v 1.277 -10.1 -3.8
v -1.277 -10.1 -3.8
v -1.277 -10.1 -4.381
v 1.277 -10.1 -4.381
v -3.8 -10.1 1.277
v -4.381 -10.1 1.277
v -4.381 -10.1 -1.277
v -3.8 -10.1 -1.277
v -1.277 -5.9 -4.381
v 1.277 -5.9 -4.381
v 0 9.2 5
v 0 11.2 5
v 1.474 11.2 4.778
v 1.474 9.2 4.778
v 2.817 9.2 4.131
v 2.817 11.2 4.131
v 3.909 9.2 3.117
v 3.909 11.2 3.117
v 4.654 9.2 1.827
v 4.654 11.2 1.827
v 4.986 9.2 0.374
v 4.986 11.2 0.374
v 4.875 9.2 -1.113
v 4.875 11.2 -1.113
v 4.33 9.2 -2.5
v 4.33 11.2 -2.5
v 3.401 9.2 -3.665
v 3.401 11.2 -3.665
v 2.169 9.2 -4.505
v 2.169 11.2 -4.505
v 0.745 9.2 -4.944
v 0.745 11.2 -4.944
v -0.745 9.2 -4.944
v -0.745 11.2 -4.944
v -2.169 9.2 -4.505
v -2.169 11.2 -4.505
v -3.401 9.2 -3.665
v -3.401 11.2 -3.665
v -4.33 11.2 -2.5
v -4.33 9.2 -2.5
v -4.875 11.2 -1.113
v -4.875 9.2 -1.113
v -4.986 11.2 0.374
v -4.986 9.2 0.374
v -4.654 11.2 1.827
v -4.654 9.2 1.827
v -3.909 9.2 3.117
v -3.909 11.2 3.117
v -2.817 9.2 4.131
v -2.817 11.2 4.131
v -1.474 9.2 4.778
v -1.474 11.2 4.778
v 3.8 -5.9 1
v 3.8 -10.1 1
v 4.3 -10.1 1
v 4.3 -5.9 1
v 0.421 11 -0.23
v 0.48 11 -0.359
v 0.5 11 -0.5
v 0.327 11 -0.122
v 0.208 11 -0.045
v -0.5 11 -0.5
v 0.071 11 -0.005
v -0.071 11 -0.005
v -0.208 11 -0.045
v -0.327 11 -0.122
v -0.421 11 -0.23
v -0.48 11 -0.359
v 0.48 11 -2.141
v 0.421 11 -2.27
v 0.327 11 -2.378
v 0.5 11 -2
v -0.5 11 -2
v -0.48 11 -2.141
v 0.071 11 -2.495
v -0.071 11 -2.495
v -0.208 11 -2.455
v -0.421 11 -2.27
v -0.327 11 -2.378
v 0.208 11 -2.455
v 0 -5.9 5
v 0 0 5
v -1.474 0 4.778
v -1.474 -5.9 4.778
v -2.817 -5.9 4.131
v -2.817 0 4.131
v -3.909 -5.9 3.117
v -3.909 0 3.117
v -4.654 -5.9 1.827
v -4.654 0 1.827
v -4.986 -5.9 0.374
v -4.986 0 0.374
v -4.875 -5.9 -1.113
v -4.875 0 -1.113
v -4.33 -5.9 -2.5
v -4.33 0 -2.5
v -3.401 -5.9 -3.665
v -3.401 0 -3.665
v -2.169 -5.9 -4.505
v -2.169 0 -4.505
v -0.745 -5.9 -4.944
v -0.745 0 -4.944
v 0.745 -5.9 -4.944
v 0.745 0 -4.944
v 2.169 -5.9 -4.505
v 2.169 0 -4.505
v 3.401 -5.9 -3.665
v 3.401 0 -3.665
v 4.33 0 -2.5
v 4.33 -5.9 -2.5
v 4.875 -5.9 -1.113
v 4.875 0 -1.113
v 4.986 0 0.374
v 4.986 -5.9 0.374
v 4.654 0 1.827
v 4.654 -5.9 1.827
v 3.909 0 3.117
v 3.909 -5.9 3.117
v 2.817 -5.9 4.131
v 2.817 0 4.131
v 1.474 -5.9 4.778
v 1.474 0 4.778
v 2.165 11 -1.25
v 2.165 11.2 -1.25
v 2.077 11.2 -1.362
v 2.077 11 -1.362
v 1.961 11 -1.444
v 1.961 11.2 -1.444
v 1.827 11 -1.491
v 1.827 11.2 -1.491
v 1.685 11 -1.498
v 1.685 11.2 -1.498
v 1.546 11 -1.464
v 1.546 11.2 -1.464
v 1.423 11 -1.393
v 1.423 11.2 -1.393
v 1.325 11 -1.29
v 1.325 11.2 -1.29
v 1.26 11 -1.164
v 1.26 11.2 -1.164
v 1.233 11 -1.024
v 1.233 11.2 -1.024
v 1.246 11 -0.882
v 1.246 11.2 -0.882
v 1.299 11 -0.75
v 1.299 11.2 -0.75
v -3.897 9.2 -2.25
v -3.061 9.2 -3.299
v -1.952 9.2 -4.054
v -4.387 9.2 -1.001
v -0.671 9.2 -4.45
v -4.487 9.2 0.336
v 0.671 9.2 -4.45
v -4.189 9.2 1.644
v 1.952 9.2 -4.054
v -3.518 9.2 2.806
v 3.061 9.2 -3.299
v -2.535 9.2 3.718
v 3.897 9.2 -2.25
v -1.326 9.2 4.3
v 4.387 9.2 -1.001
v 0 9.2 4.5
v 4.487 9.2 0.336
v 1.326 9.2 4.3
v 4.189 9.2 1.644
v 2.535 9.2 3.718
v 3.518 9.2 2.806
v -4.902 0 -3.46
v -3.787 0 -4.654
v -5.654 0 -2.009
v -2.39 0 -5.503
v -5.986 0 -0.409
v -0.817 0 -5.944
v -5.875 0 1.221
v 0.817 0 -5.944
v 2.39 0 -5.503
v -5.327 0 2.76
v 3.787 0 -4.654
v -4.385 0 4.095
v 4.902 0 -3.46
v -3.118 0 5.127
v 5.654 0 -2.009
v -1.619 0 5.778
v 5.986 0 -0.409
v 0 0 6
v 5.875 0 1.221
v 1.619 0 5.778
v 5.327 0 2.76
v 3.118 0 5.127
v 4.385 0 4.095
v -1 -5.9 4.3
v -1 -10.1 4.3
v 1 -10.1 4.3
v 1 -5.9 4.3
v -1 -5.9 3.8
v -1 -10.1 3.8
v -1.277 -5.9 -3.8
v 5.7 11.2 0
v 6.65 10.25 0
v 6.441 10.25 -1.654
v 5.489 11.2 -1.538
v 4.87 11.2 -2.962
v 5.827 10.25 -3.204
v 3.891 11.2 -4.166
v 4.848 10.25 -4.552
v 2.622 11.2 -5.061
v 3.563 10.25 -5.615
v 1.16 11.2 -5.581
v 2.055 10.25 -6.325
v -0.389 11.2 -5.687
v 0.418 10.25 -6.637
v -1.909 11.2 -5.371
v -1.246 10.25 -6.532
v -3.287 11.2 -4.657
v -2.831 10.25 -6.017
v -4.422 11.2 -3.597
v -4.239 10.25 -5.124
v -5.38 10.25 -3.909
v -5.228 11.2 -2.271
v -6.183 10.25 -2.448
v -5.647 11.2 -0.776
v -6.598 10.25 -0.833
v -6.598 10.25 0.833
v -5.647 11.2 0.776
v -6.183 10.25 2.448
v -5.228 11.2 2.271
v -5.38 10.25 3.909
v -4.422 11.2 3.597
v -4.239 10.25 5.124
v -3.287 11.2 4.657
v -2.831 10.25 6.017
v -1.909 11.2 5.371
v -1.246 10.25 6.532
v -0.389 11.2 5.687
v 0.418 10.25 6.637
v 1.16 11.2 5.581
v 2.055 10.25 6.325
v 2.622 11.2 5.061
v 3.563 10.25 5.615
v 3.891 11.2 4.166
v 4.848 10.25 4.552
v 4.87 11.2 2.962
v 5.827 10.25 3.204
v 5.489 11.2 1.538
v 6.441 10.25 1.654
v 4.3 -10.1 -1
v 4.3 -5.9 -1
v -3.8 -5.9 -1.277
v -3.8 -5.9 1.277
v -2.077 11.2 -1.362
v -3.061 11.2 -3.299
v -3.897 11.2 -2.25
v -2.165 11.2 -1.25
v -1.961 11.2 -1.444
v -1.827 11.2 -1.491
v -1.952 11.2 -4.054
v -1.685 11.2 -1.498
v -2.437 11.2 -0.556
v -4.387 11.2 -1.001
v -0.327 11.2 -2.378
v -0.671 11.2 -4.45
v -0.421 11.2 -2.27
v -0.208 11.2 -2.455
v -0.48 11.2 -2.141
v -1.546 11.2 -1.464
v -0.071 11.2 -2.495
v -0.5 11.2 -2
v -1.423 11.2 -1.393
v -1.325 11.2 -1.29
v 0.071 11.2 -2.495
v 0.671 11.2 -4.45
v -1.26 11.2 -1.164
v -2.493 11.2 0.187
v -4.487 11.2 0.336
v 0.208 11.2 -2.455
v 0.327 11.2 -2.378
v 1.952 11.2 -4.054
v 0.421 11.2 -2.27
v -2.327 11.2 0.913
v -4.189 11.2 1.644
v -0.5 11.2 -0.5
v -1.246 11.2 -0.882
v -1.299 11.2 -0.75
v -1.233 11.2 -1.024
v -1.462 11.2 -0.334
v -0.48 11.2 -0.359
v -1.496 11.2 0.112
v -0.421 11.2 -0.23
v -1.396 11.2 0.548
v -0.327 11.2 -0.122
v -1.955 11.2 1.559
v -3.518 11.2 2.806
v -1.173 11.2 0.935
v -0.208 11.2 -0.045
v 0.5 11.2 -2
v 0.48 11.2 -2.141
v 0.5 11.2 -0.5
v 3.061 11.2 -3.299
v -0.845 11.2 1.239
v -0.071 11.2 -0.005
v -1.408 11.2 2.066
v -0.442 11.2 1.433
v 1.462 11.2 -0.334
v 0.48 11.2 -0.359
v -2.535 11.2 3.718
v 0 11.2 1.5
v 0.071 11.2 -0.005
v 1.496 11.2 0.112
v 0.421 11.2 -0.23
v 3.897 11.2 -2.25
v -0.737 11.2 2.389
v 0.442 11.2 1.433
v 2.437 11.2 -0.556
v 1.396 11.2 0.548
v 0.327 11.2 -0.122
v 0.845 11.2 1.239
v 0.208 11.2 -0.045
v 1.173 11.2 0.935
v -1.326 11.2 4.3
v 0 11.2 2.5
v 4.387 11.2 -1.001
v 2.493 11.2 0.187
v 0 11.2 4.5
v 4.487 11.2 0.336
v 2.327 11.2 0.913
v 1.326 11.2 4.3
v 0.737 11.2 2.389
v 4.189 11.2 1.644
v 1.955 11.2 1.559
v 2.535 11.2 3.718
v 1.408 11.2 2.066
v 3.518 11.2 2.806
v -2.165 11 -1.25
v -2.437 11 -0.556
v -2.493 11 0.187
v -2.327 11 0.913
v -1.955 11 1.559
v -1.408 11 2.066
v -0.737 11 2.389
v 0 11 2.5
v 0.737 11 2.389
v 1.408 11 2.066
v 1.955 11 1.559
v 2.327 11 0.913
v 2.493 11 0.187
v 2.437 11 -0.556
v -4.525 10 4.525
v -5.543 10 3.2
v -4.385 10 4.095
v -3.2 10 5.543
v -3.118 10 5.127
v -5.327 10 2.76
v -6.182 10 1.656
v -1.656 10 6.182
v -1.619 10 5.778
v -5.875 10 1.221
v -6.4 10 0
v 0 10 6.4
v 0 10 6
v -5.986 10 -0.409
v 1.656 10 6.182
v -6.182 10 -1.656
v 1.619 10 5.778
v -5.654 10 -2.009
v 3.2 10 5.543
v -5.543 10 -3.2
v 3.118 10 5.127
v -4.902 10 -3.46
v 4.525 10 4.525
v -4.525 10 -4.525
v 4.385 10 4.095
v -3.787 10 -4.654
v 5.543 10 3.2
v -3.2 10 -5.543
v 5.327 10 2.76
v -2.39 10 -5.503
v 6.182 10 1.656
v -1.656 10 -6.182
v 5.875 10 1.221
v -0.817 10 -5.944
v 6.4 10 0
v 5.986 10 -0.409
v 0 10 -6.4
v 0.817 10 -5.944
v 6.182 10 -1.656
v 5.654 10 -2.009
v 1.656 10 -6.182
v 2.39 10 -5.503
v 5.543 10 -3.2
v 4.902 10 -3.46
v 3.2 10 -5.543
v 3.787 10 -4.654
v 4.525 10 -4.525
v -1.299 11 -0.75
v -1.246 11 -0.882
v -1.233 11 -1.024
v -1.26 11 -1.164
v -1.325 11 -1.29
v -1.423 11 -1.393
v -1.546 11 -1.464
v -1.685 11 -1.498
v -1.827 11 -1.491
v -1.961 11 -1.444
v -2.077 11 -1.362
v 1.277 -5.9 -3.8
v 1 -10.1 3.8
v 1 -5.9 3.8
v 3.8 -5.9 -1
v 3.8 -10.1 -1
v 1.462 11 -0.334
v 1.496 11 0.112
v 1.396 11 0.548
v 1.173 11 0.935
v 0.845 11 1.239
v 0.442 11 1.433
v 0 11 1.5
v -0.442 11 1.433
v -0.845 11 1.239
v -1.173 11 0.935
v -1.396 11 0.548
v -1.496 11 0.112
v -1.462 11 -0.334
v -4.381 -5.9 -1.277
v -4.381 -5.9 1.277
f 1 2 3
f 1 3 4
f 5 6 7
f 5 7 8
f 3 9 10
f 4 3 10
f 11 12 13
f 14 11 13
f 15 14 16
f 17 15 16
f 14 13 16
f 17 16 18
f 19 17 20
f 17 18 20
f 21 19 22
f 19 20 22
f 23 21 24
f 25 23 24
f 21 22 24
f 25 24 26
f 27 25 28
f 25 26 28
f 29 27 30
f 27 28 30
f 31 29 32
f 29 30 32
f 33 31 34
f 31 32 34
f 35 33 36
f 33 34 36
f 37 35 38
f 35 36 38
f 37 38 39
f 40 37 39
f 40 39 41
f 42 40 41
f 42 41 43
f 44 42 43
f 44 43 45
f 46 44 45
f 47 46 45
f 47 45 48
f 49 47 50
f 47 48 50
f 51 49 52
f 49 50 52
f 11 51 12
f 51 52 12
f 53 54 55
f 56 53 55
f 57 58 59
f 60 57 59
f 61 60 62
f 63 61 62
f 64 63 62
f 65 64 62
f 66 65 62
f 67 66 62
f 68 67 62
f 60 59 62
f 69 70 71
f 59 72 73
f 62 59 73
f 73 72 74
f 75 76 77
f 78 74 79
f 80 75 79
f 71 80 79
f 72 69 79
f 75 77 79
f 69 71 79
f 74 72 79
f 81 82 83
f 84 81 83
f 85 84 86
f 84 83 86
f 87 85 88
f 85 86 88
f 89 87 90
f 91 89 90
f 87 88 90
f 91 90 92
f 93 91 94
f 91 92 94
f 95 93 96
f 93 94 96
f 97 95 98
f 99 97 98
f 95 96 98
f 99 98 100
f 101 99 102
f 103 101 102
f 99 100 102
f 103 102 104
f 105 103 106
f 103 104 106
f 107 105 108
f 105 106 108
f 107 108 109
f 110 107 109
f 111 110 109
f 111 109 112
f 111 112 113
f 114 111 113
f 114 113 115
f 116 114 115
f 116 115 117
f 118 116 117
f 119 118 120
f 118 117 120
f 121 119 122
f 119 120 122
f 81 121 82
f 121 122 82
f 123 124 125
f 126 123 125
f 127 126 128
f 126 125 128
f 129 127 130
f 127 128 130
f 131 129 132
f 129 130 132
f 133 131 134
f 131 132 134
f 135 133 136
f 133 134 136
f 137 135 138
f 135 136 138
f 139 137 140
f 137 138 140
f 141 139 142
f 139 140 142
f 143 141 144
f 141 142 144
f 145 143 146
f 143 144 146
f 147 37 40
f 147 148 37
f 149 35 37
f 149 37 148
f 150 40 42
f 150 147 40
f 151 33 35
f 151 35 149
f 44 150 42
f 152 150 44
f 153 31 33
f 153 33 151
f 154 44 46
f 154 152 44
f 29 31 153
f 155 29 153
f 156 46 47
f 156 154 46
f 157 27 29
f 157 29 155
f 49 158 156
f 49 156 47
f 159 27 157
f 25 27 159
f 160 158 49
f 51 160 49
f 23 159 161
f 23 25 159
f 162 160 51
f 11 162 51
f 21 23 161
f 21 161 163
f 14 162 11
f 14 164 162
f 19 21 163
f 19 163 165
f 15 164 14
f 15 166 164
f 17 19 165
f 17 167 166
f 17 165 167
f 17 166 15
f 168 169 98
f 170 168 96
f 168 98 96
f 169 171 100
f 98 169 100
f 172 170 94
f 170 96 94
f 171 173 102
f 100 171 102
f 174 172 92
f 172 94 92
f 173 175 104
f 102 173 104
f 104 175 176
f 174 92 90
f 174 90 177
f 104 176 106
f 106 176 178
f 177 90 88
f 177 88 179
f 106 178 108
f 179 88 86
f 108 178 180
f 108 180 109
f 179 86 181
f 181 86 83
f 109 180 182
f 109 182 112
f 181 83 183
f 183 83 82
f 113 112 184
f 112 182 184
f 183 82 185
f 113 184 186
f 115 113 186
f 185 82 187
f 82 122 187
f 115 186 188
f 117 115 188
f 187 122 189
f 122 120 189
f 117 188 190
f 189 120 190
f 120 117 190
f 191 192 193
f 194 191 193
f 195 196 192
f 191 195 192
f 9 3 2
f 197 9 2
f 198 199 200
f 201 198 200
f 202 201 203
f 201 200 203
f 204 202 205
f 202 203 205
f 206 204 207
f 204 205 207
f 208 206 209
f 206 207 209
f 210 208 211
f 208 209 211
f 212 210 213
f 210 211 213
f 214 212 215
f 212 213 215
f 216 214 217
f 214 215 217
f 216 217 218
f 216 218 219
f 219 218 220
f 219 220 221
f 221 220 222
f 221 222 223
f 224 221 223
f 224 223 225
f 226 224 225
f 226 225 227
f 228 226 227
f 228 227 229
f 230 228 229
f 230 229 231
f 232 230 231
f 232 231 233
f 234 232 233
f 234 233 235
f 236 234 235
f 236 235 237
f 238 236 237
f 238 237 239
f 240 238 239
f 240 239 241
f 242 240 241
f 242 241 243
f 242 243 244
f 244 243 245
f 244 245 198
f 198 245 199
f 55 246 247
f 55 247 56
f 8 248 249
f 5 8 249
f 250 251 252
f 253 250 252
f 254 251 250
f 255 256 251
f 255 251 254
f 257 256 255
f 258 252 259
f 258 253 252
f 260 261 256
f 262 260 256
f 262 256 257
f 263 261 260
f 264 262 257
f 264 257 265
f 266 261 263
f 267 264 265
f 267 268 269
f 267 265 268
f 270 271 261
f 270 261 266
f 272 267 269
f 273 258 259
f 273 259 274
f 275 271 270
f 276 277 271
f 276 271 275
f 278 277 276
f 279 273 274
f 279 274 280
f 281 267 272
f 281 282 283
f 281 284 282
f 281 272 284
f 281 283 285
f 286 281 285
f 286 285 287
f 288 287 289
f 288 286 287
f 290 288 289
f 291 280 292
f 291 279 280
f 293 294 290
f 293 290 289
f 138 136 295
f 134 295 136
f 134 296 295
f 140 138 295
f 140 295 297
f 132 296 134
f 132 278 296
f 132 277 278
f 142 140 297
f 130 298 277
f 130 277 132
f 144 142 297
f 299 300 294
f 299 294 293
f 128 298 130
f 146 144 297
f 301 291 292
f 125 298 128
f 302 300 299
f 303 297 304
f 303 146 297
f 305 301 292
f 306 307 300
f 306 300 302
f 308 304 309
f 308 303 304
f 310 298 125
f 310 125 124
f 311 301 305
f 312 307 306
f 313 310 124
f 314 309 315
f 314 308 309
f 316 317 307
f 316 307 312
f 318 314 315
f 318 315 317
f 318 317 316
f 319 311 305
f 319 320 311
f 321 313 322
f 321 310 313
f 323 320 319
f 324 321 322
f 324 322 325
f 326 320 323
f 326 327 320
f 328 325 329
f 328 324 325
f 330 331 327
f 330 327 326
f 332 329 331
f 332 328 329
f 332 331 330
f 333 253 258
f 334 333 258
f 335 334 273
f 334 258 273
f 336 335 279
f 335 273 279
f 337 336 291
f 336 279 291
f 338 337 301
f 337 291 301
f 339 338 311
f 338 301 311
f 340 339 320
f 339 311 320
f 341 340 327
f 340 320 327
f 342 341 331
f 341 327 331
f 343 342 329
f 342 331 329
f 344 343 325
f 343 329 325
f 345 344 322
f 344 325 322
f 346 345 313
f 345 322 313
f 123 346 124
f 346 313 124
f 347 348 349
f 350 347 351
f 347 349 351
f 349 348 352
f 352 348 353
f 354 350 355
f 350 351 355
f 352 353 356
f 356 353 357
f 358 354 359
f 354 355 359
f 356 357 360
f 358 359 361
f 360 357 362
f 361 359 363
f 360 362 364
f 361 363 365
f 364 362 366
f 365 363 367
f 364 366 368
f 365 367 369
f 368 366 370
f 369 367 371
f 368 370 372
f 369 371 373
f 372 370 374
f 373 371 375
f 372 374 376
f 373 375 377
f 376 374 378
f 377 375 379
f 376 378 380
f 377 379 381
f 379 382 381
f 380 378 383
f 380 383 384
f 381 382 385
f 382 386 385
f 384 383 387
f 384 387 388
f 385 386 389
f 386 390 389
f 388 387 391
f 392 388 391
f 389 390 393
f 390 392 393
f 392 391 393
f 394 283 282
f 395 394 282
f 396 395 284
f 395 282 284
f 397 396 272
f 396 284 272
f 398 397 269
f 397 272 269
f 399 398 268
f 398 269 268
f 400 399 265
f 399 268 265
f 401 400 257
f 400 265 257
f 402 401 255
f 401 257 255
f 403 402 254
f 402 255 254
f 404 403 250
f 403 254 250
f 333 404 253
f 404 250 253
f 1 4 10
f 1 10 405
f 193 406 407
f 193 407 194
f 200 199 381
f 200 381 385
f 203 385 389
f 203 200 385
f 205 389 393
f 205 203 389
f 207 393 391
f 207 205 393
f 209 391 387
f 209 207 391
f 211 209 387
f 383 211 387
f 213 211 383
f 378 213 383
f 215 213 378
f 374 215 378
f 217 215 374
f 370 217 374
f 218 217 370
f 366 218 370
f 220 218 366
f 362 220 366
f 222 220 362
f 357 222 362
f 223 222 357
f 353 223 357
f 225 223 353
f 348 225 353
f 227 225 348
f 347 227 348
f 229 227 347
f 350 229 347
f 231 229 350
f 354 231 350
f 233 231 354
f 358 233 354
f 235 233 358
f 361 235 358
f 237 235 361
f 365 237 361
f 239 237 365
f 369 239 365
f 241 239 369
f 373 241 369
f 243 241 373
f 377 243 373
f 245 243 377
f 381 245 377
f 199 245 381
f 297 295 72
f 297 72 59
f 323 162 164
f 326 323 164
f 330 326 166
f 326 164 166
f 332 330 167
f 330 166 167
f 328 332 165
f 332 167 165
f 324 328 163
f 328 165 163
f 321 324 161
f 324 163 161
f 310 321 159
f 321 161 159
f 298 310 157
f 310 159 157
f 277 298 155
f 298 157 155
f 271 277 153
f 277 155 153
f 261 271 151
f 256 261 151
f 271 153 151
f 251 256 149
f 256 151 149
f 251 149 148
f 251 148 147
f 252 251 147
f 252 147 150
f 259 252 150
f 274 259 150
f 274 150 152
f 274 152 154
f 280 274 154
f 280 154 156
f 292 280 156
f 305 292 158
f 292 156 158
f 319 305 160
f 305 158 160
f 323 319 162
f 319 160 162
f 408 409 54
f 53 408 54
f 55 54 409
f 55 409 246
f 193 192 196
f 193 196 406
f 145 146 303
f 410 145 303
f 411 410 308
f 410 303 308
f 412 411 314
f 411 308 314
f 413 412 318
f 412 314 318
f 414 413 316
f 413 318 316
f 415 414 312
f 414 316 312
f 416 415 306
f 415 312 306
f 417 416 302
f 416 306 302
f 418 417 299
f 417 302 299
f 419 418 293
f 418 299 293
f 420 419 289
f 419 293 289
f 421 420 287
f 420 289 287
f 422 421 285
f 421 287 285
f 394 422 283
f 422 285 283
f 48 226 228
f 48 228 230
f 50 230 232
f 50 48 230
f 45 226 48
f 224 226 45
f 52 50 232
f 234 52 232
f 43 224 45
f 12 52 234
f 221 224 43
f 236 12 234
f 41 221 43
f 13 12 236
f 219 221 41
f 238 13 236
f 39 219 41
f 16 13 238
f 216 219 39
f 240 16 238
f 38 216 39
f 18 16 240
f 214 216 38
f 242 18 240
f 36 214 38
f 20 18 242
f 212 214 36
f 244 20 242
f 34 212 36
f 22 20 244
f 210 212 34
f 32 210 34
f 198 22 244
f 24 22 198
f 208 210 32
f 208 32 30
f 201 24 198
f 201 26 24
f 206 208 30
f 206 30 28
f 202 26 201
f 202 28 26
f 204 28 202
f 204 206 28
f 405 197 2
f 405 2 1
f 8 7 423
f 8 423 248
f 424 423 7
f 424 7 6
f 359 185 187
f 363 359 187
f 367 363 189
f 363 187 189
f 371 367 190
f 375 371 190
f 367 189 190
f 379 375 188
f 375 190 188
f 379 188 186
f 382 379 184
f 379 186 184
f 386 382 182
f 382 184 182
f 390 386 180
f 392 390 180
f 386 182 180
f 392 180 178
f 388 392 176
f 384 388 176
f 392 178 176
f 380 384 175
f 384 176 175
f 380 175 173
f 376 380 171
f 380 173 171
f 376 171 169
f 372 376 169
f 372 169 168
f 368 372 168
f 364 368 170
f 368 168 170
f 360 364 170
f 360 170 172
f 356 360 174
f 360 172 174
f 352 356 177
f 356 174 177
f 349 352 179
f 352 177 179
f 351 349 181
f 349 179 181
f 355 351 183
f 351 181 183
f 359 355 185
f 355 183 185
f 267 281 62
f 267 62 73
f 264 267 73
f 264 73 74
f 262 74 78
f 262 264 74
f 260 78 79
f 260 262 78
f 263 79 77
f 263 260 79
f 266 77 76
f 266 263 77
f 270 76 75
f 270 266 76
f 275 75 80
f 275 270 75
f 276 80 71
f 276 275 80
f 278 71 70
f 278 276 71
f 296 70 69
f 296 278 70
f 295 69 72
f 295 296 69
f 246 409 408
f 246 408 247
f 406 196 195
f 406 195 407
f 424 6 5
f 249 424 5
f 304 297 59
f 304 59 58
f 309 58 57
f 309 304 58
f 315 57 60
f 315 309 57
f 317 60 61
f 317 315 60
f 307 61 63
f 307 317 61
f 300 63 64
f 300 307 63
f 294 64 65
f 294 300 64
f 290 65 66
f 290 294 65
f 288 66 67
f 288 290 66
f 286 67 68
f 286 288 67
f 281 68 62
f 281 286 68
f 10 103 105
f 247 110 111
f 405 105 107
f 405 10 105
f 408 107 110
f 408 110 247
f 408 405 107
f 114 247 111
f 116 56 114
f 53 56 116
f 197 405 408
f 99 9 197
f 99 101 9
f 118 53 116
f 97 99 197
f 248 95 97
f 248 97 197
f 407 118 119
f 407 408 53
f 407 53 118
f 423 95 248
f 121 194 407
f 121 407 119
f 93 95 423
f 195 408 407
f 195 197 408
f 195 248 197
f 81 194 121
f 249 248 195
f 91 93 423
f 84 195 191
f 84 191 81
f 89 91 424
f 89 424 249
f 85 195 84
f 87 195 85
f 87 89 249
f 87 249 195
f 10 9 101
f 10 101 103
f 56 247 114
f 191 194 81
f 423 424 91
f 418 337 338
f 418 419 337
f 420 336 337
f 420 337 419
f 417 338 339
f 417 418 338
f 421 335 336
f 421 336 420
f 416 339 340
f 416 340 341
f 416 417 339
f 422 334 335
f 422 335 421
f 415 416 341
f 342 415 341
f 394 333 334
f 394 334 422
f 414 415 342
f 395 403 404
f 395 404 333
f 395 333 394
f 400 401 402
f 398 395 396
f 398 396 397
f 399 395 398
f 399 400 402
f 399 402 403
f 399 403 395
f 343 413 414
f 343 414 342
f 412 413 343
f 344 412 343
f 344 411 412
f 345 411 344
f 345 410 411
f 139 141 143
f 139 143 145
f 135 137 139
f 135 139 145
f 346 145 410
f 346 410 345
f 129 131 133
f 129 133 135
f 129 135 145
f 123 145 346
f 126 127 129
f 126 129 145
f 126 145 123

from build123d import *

# Parameters (mm, degrees)
SKETCH_1_R          = 6
EXTRUDE_1_DEPTH     = 10
SKETCH_2_R          = 5.7
SKETCH_3_R          = 6.9
CHAMFER_1_SIZE      = 0.5
CHAMFER_1_SIZE2     = 0.353553391
SKETCH_4_R          = 5
CUT_EXTRUDE_1_DEPTH = 2
SKETCH_5_R          = 4.5
EXTRUDE_2_DEPTH     = 2
CUT_EXTRUDE_2_DEPTH = 0.2
SKETCH_20_R         = 5
EXTRUDE_3_DEPTH     = 5.9
SKETCH_21_W         = 2
SKETCH_21_H         = 0.5
SKETCH_21_W_2       = 2.554126296
SKETCH_21_H_2       = 0.581017117
SKETCH_21_W_3       = 0.5
SKETCH_21_H_3       = 2
SKETCH_21_W_4       = 0.581017117
SKETCH_21_H_4       = 2.554126296
EXTRUDE_4_DEPTH     = 4.2


with BuildPart() as part:
    # 草图1 → 凸台-拉伸1 (new body)
    with BuildSketch(Plane(origin=(0, 0, 0), x_dir=(1, 0, 0), z_dir=(0, 1, 0))):
        with Locations(Location((0, 0, 0), (0, 0, 270))):
            Circle(SKETCH_1_R)
    extrude(amount=EXTRUDE_1_DEPTH)

    # 草图2 → 放样1 section 0
    with BuildSketch(Plane(origin=(0, 11.2, 0), x_dir=(1, 0, 0), z_dir=(0, 1, 0))):
        Circle(SKETCH_2_R)
    # 草图3 → 放样1 section 1
    with BuildSketch(Plane(origin=(0, 10, 0), x_dir=(1, 0, 0), z_dir=(0, 1, 0))):
        Circle(SKETCH_3_R)
    loft()

    # 倒角1
    chamfer_1_edges = [part.edges().sort_by_distance(p)[0] for p in [
        (-6.9, 10, 0),
    ]]
    chamfer_1_side = [part.faces().sort_by_distance(p)[0] for p in [
        (-6.704838528, 10, 0),
    ]]
    chamfer(chamfer_1_edges, length=CHAMFER_1_SIZE, length2=CHAMFER_1_SIZE2, reference=chamfer_1_side[0])

    # 草图4 → 切除-拉伸1 (cut)
    with BuildSketch(Plane(origin=(0, 11.2, 0), x_dir=(1, 0, 0), z_dir=(0, 1, 0))):
        with Locations(Location((0, 0, 0), (0, 0, 270))):
            Circle(SKETCH_4_R)
    extrude(amount=-CUT_EXTRUDE_1_DEPTH, mode=Mode.SUBTRACT)

    # 草图5 → 凸台-拉伸2 (add)
    with BuildSketch(Plane(origin=(0, 9.2, 0), x_dir=(1, 0, 0), z_dir=(0, 1, 0))):
        with Locations(Location((0, 0, 0), (0, 0, 270))):
            Circle(SKETCH_5_R)
    extrude(amount=EXTRUDE_2_DEPTH)

    # 草图6 → 切除-拉伸2 (cut)
    with BuildSketch(Plane(origin=(0, 11.2, 0), x_dir=(1, 0, 0), z_dir=(0, 1, 0))):
        with BuildLine():
            Line((-0.5, 0.5), (-0.5, 2))
            ThreePointArc((-0.5, 2), (0, 2.5), (0.5, 2))
            Line((0.5, 2), (0.5, 0.5))
            ThreePointArc((0.5, 0.5), (0, 0), (-0.5, 0.5))
        make_face()
        with BuildLine():
            ThreePointArc((-2.165063509, 1.25), (0, -2.5), (2.165063509, 1.25))
            ThreePointArc((2.165063509, 1.25), (1.482050808, 1.433012702), (1.299038106, 0.75))
            ThreePointArc((1.299038106, 0.75), (0, -1.5), (-1.299038106, 0.75))
            ThreePointArc((-1.299038106, 0.75), (-1.482050808, 1.433012702), (-2.165063509, 1.25))
        make_face()
    extrude(amount=-CUT_EXTRUDE_2_DEPTH, mode=Mode.SUBTRACT)

    # 草图20 → 凸台-拉伸3 (add)
    with BuildSketch(Plane.XZ):
        with Locations(Location((0, 0, 0), (0, 0, 90))):
            Circle(SKETCH_20_R)
    extrude(amount=EXTRUDE_3_DEPTH)

    # 草图21 → 凸台-拉伸4 (add)
    with BuildSketch(Plane.XZ.offset(5.9)):
        with Locations((0, 4.05)):
            Rectangle(SKETCH_21_W, SKETCH_21_H)
        with Locations((0, -4.090508558)):
            Rectangle(SKETCH_21_W_2, SKETCH_21_H_2)
        with Locations((4.05, 0)):
            Rectangle(SKETCH_21_W_3, SKETCH_21_H_3)
        with Locations((-4.090508558, 0)):
            Rectangle(SKETCH_21_W_4, SKETCH_21_H_4)
    extrude(amount=EXTRUDE_4_DEPTH)


solid = part.part
